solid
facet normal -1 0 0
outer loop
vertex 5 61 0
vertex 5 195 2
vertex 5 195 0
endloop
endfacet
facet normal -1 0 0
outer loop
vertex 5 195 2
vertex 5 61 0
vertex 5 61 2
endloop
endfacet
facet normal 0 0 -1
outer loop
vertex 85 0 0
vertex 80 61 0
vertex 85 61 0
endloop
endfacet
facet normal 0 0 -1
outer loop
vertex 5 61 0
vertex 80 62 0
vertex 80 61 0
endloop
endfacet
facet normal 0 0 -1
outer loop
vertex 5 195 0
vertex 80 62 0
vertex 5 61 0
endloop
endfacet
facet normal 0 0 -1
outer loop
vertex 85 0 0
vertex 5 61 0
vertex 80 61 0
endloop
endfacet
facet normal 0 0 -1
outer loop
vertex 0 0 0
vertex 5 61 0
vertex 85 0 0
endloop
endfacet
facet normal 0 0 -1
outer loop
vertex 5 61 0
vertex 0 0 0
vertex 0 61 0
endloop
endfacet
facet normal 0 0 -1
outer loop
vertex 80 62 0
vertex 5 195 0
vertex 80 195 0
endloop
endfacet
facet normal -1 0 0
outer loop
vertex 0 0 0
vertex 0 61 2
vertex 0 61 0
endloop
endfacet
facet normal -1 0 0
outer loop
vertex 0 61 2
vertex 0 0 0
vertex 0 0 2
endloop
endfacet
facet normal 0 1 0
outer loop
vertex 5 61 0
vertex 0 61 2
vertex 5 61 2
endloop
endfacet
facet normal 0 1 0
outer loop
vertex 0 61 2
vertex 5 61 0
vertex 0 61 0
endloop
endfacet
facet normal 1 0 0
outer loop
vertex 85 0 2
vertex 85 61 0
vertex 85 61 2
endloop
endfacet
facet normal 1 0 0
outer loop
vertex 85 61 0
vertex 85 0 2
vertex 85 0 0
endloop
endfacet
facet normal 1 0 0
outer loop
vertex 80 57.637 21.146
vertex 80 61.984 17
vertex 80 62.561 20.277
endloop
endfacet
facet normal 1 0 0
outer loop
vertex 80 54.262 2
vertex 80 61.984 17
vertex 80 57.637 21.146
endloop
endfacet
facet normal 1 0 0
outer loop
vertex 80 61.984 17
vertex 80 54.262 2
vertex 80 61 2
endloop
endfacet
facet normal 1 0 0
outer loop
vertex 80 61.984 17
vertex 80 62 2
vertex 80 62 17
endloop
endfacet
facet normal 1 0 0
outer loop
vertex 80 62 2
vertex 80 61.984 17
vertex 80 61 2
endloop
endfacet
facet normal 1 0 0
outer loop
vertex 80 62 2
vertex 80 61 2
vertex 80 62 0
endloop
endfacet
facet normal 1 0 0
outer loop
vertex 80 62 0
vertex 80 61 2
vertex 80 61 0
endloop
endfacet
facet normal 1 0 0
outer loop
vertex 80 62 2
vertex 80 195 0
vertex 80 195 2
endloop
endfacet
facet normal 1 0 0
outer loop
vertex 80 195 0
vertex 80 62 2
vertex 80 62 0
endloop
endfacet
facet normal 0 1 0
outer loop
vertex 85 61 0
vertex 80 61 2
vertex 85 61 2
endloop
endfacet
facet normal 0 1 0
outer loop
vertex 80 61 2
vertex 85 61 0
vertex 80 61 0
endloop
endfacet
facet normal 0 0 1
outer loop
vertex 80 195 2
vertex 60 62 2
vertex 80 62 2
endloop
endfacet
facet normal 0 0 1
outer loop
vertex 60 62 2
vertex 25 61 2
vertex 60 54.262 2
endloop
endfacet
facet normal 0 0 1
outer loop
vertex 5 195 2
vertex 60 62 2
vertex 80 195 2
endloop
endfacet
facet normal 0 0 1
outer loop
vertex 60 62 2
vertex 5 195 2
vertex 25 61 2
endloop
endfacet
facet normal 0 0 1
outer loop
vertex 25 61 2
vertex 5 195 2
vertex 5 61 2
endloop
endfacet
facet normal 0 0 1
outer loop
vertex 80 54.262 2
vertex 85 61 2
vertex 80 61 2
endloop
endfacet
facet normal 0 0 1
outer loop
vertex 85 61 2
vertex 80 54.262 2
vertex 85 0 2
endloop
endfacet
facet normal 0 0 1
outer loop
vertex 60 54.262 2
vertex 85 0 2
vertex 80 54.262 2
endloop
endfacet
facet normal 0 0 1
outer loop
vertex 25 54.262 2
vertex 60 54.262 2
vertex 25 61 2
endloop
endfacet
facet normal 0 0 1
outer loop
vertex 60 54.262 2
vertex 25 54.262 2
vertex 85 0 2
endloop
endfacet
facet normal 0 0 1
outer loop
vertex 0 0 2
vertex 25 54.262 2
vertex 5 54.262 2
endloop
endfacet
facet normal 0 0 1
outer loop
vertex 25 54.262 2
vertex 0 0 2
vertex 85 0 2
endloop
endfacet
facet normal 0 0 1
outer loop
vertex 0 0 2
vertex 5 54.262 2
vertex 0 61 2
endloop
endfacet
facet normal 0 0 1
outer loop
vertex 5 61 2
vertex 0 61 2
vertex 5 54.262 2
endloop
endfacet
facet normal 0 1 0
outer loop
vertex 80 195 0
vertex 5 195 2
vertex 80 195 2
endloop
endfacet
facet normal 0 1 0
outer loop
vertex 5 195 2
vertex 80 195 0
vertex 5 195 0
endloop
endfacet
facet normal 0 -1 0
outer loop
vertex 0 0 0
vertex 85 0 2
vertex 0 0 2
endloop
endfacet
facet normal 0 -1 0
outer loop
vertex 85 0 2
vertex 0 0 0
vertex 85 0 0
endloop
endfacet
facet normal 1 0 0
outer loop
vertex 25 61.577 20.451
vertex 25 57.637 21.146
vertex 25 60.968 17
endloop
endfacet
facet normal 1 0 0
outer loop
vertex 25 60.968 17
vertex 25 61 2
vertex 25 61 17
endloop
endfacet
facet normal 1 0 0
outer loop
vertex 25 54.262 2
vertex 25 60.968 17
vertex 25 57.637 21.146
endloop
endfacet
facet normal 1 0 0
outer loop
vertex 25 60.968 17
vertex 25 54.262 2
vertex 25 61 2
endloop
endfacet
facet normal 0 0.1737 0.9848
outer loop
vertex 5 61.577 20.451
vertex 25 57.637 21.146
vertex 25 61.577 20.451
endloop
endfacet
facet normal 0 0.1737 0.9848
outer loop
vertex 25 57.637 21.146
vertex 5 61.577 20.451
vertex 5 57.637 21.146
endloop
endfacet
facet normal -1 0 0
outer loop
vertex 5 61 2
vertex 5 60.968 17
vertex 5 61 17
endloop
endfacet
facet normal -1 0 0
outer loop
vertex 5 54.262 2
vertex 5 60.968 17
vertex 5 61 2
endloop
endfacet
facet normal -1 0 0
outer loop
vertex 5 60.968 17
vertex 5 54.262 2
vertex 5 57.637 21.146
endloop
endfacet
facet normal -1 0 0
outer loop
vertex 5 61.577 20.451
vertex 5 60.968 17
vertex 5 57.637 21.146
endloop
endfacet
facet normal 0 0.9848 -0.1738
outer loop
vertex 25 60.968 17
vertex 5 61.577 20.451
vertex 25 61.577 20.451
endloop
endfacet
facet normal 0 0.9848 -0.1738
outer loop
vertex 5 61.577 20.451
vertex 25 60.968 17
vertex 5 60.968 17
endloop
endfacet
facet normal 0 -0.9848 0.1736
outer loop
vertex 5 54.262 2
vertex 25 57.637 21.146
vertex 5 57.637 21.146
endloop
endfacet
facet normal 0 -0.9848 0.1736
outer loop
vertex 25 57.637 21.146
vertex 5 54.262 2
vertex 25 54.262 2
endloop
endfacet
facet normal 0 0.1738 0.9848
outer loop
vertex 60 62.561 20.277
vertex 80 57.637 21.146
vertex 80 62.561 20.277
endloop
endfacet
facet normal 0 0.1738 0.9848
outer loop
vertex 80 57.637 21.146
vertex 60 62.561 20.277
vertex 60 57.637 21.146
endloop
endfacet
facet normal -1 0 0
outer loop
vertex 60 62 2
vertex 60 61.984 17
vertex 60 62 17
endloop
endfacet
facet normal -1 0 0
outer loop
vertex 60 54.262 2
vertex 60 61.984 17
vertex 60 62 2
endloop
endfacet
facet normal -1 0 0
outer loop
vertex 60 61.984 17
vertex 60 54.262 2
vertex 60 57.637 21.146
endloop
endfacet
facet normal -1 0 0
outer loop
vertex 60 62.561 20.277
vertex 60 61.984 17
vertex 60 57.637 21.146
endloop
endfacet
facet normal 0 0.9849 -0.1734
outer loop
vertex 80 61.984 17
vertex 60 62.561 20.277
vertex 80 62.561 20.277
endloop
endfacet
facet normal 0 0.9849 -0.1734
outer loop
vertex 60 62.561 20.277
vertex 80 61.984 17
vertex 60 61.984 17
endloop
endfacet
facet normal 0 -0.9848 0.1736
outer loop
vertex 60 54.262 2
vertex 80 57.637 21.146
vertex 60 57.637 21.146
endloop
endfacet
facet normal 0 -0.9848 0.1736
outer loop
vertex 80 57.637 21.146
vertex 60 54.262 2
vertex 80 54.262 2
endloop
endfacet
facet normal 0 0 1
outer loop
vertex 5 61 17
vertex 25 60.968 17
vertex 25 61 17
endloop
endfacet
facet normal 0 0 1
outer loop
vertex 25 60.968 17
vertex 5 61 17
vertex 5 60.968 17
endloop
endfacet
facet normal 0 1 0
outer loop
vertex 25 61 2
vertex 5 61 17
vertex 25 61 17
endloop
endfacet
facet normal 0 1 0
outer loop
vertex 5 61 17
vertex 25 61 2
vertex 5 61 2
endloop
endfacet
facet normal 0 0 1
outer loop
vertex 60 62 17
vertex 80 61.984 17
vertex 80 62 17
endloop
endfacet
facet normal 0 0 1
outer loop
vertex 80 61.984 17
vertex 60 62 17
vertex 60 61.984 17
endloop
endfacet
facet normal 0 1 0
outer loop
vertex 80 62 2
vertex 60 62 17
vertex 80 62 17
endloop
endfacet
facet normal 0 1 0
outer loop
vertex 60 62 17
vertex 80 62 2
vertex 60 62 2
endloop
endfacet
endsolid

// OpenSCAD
/*
Držák na mobil IKEA style skládací
*/

module fixer(){
    difference(){
        cube(size=[25,25,16], center=true);
        translate([0,0,-6]) union(){
            color("Red") cube(size=[1.9,26,16], center=true);
            color("Red") cube(size=[26,1.9,16], center=true);
            }//union
        }//diff
    }//module
    
module short_part_extra(width=85, length=120, hole=3.5){
    union(){
        difference(){
            color("Blue", alpha=1) translate([0,0,0]) cube(size=[85,length,2], center=false);
            //color("Red", alpha=1) translate([-0.1,30,-1]) cube(size=[0.5*width,hole,5], center=false);
        }//diff
        color("Blue", alpha=1) rotate([0,90,0]) translate([-5,0,15]) cube(size=[5,length,2], center=false);
        color("Blue", alpha=1) rotate([0,90,0]) translate([-5,0,30]) cube(size=[5,length,2], center=false);
        color("Blue", alpha=1) rotate([0,90,0]) translate([-5,0,42]) cube(size=[5,length,2], center=false);
        color("Blue", alpha=1) rotate([0,90,0]) translate([-5,0,55]) cube(size=[5,length,2], center=false);
        color("Blue", alpha=1) rotate([0,90,0]) translate([-5,0,70]) cube(size=[5,length,2], center=false);
    }//union
    }//module

module short_part(width=85, length=120, hole=3.5){
    
        difference(){
            color("Blue", alpha=1) translate([0,0,0]) cube(size=[85,length,2], center=false);
            union(){
                color("Red", alpha=1) translate([0,61,0]) cube(size=[5,length,4], center=false);
                color("Red", alpha=1) translate([80,61,0]) cube(size=[5,length,4], center=false);
                }//union
            //color("Red", alpha=1) translate([-0.1,30,-1]) cube(size=[0.5*width,hole,5], center=false);
        }//diff
        //color("Blue", alpha=1) rotate([-10,0,0]) translate([0,0,0]) cube(size=[85,length,2], center=false);
    
    }//module
    


module long_part(width=85, length=195){
    
        short_part(width, length,4);
        
        translate([0,0,11]) rotate([-10,0,0]) union(){
        color("Green", alpha=1) translate([5,55,0]) cube(size=[20,4,20], center=false);
        color("Green", alpha=1) translate([width-30-5+10,55,0]) cube(size=[20,5,20], center=false);
        }//union

        translate([0,2,0]) rotate([0,0,0]) union(){
        color("Green", alpha=1) translate([5,55,0]) cube(size=[20,4,17], center=false);
        color("Green", alpha=1) translate([width-30-5+10,55,0]) cube(size=[20,5,17], center=false);
        }//union
    


    }//module
    
//translate ([-90,0,0]) short_part_extra();
long_part();
//fixer();
